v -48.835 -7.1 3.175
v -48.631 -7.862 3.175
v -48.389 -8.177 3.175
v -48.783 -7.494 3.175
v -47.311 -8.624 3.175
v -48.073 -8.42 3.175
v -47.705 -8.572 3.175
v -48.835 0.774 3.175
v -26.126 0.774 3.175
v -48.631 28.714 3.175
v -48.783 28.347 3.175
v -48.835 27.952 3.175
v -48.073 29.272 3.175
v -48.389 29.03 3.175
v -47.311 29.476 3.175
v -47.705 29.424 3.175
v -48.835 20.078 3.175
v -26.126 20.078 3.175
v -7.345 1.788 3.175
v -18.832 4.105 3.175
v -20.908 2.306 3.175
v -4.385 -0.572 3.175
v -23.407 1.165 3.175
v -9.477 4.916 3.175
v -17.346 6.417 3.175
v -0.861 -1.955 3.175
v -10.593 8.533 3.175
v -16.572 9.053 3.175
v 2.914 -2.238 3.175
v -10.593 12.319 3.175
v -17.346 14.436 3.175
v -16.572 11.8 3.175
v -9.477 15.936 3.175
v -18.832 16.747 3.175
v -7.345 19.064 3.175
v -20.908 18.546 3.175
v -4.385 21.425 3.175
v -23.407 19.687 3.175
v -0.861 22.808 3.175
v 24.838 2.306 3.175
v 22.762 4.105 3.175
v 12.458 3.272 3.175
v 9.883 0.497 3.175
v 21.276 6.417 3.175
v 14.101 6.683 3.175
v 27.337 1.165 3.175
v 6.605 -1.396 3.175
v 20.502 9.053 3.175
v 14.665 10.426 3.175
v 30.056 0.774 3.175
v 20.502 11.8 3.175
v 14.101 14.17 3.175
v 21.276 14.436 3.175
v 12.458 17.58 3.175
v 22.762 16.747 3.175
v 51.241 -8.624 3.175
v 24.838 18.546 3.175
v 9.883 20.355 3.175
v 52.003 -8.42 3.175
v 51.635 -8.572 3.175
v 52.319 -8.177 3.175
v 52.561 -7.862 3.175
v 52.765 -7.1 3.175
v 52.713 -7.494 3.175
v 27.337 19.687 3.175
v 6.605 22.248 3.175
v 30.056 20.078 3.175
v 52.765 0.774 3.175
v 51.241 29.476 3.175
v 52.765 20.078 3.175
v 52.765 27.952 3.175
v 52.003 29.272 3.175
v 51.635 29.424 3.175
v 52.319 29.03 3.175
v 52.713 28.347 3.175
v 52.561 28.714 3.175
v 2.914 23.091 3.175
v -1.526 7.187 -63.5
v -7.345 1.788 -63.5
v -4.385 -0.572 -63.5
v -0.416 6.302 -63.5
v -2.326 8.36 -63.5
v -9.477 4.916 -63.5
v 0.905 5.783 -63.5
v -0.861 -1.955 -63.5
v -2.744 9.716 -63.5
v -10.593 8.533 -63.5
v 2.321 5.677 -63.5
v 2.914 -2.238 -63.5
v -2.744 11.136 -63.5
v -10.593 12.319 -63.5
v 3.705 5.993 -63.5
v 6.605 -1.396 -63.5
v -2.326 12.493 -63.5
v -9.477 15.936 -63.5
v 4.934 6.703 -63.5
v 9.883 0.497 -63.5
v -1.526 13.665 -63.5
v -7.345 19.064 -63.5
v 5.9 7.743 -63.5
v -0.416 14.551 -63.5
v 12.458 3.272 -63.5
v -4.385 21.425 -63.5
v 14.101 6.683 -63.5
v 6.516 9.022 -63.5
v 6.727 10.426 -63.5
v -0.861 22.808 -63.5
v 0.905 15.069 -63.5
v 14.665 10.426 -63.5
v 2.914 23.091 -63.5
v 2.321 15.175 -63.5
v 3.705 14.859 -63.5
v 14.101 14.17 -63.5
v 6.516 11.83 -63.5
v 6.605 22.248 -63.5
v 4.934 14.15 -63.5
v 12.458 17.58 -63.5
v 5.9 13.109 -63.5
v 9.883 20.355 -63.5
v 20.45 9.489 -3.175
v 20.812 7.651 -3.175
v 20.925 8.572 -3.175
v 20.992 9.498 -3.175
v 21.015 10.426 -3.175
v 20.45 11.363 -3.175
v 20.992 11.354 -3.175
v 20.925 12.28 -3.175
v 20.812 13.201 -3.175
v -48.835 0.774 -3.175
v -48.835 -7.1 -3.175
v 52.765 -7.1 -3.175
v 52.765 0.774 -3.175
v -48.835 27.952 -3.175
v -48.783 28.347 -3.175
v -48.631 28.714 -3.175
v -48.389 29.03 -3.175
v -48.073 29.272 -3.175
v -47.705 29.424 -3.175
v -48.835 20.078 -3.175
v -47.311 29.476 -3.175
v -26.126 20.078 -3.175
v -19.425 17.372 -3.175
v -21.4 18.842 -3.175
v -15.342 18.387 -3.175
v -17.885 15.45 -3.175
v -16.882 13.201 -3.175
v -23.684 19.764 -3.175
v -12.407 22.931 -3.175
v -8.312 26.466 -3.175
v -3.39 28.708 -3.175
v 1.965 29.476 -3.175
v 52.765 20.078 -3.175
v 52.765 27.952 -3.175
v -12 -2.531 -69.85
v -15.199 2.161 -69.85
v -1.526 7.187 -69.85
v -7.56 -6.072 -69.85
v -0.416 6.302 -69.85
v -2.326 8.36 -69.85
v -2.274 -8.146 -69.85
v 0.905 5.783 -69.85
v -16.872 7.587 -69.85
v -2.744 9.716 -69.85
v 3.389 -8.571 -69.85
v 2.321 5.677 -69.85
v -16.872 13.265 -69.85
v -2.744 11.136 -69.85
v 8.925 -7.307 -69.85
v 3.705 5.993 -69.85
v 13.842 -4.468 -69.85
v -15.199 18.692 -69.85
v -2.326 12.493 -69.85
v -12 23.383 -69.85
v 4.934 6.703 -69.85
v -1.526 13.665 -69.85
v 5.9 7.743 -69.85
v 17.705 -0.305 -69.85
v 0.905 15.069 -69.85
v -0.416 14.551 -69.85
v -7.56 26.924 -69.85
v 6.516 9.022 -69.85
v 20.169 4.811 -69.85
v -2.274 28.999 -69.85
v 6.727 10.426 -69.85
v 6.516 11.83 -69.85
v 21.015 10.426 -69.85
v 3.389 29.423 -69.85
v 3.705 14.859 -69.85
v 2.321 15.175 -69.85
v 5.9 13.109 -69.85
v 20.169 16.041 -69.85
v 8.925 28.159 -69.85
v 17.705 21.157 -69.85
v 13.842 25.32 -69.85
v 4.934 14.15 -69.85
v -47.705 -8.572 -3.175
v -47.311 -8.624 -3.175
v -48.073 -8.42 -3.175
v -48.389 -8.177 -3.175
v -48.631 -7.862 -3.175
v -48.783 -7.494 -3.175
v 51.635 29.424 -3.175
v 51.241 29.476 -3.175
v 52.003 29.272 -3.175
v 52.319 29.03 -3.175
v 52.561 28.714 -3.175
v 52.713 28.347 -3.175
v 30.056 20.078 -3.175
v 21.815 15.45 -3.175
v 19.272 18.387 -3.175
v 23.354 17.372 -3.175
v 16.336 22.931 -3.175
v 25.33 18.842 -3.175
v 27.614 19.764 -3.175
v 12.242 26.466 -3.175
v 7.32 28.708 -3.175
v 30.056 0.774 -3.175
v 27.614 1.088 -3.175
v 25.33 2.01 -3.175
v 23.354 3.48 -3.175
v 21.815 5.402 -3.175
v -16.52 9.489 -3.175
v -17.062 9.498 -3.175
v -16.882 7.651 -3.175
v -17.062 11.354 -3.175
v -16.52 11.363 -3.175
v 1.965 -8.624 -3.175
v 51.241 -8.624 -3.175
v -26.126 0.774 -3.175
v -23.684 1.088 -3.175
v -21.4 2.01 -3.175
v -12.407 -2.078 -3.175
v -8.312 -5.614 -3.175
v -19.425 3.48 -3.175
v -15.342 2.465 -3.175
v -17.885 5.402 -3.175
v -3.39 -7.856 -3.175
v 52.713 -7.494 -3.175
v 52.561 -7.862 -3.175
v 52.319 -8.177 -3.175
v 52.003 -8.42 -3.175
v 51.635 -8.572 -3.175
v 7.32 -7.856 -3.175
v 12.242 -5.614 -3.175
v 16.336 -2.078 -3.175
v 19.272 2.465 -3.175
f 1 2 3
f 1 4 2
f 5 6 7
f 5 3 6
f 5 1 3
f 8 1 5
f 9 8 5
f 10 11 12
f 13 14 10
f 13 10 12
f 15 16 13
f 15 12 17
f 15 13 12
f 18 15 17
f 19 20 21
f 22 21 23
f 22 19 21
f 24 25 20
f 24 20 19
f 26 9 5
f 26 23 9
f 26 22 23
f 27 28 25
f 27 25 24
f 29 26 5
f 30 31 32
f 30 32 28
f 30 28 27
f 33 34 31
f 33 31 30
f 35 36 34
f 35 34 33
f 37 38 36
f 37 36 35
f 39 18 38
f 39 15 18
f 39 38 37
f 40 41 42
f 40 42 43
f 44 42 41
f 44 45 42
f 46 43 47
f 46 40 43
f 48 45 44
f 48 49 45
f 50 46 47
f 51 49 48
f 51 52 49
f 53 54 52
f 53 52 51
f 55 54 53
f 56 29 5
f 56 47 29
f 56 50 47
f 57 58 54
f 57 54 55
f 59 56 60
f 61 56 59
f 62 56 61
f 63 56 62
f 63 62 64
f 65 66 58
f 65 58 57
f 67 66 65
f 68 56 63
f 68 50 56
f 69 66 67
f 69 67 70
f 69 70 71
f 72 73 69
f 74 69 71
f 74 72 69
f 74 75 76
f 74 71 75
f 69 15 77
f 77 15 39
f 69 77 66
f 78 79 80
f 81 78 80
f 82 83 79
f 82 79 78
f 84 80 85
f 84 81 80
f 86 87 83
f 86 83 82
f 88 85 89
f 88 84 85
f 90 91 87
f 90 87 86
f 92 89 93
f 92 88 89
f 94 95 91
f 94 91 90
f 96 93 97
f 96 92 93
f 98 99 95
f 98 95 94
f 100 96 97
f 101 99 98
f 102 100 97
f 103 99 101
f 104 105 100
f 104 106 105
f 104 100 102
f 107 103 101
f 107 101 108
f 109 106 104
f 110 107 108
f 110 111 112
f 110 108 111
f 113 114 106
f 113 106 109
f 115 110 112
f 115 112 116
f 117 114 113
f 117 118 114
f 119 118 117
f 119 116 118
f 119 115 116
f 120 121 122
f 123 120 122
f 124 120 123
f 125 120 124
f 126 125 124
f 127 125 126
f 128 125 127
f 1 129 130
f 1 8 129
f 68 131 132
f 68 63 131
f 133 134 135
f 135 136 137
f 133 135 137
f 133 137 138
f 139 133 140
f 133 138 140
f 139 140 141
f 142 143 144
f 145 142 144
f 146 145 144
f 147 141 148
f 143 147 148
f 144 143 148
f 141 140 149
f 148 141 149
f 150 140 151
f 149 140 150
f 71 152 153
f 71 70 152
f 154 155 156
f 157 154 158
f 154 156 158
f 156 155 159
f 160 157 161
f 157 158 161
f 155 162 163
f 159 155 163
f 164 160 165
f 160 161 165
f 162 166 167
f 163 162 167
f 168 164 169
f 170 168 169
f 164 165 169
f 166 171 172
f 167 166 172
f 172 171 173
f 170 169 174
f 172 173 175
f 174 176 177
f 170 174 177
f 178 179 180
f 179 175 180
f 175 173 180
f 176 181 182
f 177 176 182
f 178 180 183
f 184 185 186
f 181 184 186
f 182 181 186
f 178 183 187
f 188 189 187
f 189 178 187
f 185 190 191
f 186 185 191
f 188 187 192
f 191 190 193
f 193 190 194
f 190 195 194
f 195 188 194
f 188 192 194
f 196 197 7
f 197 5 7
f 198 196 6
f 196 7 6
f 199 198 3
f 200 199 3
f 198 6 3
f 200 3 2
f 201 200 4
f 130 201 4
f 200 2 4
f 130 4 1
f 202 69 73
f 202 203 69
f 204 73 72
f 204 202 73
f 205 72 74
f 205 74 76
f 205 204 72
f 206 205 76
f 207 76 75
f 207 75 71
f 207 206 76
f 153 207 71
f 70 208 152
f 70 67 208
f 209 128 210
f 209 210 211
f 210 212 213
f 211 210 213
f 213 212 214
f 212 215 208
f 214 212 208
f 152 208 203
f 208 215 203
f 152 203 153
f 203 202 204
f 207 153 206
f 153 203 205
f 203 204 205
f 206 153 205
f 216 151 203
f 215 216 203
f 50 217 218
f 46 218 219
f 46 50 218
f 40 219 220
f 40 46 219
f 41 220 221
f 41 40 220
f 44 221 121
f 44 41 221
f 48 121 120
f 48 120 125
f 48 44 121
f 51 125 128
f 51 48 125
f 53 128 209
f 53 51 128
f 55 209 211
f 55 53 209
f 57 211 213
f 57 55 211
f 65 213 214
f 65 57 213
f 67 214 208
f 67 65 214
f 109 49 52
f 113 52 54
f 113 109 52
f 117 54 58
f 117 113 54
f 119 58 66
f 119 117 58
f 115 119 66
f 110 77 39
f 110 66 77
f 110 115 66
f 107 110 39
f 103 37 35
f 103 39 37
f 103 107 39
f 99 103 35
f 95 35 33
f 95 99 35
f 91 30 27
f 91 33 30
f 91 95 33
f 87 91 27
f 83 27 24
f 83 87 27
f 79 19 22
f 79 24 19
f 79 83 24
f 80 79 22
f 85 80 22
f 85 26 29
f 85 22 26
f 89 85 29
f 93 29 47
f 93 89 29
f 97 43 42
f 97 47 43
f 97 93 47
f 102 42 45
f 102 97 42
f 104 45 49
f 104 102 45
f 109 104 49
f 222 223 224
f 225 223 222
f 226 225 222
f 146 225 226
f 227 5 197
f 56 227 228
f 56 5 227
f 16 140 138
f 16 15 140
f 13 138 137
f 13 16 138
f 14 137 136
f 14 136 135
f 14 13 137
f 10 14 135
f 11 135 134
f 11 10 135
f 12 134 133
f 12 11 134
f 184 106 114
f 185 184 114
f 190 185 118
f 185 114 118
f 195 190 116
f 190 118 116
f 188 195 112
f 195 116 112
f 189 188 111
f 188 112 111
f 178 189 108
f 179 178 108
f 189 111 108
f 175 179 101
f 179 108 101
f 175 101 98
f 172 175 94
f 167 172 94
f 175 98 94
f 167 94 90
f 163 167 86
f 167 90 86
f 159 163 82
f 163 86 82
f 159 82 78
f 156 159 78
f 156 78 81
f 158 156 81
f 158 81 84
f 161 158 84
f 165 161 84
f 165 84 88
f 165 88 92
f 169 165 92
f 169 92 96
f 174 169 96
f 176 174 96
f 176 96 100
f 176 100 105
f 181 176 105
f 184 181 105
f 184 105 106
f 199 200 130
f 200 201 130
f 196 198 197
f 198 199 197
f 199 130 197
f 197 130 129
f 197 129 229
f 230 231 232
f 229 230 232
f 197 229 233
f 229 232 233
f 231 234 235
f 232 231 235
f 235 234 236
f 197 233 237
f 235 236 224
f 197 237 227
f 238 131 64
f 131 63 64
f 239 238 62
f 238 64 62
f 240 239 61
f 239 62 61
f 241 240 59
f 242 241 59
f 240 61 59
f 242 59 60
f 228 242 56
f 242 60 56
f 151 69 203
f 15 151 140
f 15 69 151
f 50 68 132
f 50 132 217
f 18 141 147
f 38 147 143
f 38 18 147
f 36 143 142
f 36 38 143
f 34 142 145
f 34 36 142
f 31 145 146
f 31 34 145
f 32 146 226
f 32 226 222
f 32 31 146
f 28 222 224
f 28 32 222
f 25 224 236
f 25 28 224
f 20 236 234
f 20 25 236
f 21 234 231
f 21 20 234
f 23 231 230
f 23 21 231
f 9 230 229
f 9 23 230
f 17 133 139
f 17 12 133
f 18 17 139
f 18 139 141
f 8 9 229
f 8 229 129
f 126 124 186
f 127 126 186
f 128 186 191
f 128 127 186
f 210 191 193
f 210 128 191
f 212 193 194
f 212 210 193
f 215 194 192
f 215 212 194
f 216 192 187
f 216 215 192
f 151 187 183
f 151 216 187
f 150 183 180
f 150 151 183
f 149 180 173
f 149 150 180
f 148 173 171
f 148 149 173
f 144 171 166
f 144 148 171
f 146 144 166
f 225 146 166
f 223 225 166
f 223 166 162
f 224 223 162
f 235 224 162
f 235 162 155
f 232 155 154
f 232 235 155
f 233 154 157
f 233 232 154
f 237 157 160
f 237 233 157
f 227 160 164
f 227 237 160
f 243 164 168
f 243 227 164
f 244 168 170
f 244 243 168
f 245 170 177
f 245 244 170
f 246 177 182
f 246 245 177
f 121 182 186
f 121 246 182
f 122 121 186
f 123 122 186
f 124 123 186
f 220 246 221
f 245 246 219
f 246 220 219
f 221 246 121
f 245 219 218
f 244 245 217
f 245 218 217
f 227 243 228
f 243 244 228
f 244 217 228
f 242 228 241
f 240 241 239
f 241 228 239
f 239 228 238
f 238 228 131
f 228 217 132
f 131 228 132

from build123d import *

# Parameters (mm, degrees)
F1_DEPTH      = 3.175
F2_R          = 1.524
F5_START      = -3.175
F4_R          = 19.05
F5_DEPTH      = 66.675
F3_R          = 12.7
F6_DEPTH      = 63.5
F6_DEPTH_BACK = 25.4
F7_R          = 4.7625
F8_DEPTH      = 75.09229


with BuildPart() as f1:
    # F0 (on Top) → F1 (new body, symmetric)
    with BuildSketch(Plane.XY):
        with BuildLine():
            Line((52.7649549718, 29.4761320562), (-48.8350450282, 29.4761320562))
            Line((-48.8350450282, 29.4761320562), (-48.8350450282, 20.0781320562))
            Line((-48.8350450282, 20.0781320562), (-26.1262064392, 20.0781320562))
            ThreePointArc((-26.1262064392, 20.0781320562), (-16.4742064392, 10.4261320562), (-26.1262064392, 0.7741320562))
            Line((-26.1262064392, 0.7741320562), (-48.8350450282, 0.7741320562))
            Line((-48.8350450282, 0.7741320562), (-48.8350450282, -8.6238679438))
            Line((-48.8350450282, -8.6238679438), (52.7649549718, -8.6238679438))
            Line((52.7649549718, -8.6238679438), (52.7649549718, 0.7741320562))
            Line((52.7649549718, 0.7741320562), (30.0561163827, 0.7741320562))
            ThreePointArc((30.0561163827, 0.7741320562), (20.4041163827, 10.4261320562), (30.0561163827, 20.0781320562))
            Line((30.0561163827, 20.0781320562), (52.7649549718, 20.0781320562))
            Line((52.7649549718, 20.0781320562), (52.7649549718, 29.4761320562))
        make_face()
    extrude(amount=F1_DEPTH, both=True)

    # F2
    f2_edges = [f1.edges().sort_by_distance(p)[0] for p in [
        (52.764955, 29.476132, 0),
        (52.764955, -8.623868, 0),
        (-48.835045, -8.623868, 0),
        (-48.835045, 29.476132, 0),
    ]]
    fillet(f2_edges, radius=F2_R)

    # F4 (on Top) → F5 (join)
    with BuildSketch(Plane.XY.offset(F5_START)):
        with Locations((1.9649549718, 10.4261320562)):
            Circle(F4_R)
    extrude(amount=-F5_DEPTH)

    # F3 (on Top) → F6 (cut, two sides)
    with BuildSketch(Plane.XY) as f6_sk:
        with Locations((1.9649549718, 10.4261320562)):
            Circle(F3_R)
    extrude(amount=-F6_DEPTH, mode=Mode.SUBTRACT)
    extrude(f6_sk.sketch, amount=F6_DEPTH_BACK, mode=Mode.SUBTRACT)

    # F7 (on Top) → F8 (cut)
    with BuildSketch(Plane.XY):
        with Locations((1.9649549718, 10.4261320562)):
            Circle(F7_R)
    extrude(amount=-F8_DEPTH, mode=Mode.SUBTRACT)


solid = f1.part
